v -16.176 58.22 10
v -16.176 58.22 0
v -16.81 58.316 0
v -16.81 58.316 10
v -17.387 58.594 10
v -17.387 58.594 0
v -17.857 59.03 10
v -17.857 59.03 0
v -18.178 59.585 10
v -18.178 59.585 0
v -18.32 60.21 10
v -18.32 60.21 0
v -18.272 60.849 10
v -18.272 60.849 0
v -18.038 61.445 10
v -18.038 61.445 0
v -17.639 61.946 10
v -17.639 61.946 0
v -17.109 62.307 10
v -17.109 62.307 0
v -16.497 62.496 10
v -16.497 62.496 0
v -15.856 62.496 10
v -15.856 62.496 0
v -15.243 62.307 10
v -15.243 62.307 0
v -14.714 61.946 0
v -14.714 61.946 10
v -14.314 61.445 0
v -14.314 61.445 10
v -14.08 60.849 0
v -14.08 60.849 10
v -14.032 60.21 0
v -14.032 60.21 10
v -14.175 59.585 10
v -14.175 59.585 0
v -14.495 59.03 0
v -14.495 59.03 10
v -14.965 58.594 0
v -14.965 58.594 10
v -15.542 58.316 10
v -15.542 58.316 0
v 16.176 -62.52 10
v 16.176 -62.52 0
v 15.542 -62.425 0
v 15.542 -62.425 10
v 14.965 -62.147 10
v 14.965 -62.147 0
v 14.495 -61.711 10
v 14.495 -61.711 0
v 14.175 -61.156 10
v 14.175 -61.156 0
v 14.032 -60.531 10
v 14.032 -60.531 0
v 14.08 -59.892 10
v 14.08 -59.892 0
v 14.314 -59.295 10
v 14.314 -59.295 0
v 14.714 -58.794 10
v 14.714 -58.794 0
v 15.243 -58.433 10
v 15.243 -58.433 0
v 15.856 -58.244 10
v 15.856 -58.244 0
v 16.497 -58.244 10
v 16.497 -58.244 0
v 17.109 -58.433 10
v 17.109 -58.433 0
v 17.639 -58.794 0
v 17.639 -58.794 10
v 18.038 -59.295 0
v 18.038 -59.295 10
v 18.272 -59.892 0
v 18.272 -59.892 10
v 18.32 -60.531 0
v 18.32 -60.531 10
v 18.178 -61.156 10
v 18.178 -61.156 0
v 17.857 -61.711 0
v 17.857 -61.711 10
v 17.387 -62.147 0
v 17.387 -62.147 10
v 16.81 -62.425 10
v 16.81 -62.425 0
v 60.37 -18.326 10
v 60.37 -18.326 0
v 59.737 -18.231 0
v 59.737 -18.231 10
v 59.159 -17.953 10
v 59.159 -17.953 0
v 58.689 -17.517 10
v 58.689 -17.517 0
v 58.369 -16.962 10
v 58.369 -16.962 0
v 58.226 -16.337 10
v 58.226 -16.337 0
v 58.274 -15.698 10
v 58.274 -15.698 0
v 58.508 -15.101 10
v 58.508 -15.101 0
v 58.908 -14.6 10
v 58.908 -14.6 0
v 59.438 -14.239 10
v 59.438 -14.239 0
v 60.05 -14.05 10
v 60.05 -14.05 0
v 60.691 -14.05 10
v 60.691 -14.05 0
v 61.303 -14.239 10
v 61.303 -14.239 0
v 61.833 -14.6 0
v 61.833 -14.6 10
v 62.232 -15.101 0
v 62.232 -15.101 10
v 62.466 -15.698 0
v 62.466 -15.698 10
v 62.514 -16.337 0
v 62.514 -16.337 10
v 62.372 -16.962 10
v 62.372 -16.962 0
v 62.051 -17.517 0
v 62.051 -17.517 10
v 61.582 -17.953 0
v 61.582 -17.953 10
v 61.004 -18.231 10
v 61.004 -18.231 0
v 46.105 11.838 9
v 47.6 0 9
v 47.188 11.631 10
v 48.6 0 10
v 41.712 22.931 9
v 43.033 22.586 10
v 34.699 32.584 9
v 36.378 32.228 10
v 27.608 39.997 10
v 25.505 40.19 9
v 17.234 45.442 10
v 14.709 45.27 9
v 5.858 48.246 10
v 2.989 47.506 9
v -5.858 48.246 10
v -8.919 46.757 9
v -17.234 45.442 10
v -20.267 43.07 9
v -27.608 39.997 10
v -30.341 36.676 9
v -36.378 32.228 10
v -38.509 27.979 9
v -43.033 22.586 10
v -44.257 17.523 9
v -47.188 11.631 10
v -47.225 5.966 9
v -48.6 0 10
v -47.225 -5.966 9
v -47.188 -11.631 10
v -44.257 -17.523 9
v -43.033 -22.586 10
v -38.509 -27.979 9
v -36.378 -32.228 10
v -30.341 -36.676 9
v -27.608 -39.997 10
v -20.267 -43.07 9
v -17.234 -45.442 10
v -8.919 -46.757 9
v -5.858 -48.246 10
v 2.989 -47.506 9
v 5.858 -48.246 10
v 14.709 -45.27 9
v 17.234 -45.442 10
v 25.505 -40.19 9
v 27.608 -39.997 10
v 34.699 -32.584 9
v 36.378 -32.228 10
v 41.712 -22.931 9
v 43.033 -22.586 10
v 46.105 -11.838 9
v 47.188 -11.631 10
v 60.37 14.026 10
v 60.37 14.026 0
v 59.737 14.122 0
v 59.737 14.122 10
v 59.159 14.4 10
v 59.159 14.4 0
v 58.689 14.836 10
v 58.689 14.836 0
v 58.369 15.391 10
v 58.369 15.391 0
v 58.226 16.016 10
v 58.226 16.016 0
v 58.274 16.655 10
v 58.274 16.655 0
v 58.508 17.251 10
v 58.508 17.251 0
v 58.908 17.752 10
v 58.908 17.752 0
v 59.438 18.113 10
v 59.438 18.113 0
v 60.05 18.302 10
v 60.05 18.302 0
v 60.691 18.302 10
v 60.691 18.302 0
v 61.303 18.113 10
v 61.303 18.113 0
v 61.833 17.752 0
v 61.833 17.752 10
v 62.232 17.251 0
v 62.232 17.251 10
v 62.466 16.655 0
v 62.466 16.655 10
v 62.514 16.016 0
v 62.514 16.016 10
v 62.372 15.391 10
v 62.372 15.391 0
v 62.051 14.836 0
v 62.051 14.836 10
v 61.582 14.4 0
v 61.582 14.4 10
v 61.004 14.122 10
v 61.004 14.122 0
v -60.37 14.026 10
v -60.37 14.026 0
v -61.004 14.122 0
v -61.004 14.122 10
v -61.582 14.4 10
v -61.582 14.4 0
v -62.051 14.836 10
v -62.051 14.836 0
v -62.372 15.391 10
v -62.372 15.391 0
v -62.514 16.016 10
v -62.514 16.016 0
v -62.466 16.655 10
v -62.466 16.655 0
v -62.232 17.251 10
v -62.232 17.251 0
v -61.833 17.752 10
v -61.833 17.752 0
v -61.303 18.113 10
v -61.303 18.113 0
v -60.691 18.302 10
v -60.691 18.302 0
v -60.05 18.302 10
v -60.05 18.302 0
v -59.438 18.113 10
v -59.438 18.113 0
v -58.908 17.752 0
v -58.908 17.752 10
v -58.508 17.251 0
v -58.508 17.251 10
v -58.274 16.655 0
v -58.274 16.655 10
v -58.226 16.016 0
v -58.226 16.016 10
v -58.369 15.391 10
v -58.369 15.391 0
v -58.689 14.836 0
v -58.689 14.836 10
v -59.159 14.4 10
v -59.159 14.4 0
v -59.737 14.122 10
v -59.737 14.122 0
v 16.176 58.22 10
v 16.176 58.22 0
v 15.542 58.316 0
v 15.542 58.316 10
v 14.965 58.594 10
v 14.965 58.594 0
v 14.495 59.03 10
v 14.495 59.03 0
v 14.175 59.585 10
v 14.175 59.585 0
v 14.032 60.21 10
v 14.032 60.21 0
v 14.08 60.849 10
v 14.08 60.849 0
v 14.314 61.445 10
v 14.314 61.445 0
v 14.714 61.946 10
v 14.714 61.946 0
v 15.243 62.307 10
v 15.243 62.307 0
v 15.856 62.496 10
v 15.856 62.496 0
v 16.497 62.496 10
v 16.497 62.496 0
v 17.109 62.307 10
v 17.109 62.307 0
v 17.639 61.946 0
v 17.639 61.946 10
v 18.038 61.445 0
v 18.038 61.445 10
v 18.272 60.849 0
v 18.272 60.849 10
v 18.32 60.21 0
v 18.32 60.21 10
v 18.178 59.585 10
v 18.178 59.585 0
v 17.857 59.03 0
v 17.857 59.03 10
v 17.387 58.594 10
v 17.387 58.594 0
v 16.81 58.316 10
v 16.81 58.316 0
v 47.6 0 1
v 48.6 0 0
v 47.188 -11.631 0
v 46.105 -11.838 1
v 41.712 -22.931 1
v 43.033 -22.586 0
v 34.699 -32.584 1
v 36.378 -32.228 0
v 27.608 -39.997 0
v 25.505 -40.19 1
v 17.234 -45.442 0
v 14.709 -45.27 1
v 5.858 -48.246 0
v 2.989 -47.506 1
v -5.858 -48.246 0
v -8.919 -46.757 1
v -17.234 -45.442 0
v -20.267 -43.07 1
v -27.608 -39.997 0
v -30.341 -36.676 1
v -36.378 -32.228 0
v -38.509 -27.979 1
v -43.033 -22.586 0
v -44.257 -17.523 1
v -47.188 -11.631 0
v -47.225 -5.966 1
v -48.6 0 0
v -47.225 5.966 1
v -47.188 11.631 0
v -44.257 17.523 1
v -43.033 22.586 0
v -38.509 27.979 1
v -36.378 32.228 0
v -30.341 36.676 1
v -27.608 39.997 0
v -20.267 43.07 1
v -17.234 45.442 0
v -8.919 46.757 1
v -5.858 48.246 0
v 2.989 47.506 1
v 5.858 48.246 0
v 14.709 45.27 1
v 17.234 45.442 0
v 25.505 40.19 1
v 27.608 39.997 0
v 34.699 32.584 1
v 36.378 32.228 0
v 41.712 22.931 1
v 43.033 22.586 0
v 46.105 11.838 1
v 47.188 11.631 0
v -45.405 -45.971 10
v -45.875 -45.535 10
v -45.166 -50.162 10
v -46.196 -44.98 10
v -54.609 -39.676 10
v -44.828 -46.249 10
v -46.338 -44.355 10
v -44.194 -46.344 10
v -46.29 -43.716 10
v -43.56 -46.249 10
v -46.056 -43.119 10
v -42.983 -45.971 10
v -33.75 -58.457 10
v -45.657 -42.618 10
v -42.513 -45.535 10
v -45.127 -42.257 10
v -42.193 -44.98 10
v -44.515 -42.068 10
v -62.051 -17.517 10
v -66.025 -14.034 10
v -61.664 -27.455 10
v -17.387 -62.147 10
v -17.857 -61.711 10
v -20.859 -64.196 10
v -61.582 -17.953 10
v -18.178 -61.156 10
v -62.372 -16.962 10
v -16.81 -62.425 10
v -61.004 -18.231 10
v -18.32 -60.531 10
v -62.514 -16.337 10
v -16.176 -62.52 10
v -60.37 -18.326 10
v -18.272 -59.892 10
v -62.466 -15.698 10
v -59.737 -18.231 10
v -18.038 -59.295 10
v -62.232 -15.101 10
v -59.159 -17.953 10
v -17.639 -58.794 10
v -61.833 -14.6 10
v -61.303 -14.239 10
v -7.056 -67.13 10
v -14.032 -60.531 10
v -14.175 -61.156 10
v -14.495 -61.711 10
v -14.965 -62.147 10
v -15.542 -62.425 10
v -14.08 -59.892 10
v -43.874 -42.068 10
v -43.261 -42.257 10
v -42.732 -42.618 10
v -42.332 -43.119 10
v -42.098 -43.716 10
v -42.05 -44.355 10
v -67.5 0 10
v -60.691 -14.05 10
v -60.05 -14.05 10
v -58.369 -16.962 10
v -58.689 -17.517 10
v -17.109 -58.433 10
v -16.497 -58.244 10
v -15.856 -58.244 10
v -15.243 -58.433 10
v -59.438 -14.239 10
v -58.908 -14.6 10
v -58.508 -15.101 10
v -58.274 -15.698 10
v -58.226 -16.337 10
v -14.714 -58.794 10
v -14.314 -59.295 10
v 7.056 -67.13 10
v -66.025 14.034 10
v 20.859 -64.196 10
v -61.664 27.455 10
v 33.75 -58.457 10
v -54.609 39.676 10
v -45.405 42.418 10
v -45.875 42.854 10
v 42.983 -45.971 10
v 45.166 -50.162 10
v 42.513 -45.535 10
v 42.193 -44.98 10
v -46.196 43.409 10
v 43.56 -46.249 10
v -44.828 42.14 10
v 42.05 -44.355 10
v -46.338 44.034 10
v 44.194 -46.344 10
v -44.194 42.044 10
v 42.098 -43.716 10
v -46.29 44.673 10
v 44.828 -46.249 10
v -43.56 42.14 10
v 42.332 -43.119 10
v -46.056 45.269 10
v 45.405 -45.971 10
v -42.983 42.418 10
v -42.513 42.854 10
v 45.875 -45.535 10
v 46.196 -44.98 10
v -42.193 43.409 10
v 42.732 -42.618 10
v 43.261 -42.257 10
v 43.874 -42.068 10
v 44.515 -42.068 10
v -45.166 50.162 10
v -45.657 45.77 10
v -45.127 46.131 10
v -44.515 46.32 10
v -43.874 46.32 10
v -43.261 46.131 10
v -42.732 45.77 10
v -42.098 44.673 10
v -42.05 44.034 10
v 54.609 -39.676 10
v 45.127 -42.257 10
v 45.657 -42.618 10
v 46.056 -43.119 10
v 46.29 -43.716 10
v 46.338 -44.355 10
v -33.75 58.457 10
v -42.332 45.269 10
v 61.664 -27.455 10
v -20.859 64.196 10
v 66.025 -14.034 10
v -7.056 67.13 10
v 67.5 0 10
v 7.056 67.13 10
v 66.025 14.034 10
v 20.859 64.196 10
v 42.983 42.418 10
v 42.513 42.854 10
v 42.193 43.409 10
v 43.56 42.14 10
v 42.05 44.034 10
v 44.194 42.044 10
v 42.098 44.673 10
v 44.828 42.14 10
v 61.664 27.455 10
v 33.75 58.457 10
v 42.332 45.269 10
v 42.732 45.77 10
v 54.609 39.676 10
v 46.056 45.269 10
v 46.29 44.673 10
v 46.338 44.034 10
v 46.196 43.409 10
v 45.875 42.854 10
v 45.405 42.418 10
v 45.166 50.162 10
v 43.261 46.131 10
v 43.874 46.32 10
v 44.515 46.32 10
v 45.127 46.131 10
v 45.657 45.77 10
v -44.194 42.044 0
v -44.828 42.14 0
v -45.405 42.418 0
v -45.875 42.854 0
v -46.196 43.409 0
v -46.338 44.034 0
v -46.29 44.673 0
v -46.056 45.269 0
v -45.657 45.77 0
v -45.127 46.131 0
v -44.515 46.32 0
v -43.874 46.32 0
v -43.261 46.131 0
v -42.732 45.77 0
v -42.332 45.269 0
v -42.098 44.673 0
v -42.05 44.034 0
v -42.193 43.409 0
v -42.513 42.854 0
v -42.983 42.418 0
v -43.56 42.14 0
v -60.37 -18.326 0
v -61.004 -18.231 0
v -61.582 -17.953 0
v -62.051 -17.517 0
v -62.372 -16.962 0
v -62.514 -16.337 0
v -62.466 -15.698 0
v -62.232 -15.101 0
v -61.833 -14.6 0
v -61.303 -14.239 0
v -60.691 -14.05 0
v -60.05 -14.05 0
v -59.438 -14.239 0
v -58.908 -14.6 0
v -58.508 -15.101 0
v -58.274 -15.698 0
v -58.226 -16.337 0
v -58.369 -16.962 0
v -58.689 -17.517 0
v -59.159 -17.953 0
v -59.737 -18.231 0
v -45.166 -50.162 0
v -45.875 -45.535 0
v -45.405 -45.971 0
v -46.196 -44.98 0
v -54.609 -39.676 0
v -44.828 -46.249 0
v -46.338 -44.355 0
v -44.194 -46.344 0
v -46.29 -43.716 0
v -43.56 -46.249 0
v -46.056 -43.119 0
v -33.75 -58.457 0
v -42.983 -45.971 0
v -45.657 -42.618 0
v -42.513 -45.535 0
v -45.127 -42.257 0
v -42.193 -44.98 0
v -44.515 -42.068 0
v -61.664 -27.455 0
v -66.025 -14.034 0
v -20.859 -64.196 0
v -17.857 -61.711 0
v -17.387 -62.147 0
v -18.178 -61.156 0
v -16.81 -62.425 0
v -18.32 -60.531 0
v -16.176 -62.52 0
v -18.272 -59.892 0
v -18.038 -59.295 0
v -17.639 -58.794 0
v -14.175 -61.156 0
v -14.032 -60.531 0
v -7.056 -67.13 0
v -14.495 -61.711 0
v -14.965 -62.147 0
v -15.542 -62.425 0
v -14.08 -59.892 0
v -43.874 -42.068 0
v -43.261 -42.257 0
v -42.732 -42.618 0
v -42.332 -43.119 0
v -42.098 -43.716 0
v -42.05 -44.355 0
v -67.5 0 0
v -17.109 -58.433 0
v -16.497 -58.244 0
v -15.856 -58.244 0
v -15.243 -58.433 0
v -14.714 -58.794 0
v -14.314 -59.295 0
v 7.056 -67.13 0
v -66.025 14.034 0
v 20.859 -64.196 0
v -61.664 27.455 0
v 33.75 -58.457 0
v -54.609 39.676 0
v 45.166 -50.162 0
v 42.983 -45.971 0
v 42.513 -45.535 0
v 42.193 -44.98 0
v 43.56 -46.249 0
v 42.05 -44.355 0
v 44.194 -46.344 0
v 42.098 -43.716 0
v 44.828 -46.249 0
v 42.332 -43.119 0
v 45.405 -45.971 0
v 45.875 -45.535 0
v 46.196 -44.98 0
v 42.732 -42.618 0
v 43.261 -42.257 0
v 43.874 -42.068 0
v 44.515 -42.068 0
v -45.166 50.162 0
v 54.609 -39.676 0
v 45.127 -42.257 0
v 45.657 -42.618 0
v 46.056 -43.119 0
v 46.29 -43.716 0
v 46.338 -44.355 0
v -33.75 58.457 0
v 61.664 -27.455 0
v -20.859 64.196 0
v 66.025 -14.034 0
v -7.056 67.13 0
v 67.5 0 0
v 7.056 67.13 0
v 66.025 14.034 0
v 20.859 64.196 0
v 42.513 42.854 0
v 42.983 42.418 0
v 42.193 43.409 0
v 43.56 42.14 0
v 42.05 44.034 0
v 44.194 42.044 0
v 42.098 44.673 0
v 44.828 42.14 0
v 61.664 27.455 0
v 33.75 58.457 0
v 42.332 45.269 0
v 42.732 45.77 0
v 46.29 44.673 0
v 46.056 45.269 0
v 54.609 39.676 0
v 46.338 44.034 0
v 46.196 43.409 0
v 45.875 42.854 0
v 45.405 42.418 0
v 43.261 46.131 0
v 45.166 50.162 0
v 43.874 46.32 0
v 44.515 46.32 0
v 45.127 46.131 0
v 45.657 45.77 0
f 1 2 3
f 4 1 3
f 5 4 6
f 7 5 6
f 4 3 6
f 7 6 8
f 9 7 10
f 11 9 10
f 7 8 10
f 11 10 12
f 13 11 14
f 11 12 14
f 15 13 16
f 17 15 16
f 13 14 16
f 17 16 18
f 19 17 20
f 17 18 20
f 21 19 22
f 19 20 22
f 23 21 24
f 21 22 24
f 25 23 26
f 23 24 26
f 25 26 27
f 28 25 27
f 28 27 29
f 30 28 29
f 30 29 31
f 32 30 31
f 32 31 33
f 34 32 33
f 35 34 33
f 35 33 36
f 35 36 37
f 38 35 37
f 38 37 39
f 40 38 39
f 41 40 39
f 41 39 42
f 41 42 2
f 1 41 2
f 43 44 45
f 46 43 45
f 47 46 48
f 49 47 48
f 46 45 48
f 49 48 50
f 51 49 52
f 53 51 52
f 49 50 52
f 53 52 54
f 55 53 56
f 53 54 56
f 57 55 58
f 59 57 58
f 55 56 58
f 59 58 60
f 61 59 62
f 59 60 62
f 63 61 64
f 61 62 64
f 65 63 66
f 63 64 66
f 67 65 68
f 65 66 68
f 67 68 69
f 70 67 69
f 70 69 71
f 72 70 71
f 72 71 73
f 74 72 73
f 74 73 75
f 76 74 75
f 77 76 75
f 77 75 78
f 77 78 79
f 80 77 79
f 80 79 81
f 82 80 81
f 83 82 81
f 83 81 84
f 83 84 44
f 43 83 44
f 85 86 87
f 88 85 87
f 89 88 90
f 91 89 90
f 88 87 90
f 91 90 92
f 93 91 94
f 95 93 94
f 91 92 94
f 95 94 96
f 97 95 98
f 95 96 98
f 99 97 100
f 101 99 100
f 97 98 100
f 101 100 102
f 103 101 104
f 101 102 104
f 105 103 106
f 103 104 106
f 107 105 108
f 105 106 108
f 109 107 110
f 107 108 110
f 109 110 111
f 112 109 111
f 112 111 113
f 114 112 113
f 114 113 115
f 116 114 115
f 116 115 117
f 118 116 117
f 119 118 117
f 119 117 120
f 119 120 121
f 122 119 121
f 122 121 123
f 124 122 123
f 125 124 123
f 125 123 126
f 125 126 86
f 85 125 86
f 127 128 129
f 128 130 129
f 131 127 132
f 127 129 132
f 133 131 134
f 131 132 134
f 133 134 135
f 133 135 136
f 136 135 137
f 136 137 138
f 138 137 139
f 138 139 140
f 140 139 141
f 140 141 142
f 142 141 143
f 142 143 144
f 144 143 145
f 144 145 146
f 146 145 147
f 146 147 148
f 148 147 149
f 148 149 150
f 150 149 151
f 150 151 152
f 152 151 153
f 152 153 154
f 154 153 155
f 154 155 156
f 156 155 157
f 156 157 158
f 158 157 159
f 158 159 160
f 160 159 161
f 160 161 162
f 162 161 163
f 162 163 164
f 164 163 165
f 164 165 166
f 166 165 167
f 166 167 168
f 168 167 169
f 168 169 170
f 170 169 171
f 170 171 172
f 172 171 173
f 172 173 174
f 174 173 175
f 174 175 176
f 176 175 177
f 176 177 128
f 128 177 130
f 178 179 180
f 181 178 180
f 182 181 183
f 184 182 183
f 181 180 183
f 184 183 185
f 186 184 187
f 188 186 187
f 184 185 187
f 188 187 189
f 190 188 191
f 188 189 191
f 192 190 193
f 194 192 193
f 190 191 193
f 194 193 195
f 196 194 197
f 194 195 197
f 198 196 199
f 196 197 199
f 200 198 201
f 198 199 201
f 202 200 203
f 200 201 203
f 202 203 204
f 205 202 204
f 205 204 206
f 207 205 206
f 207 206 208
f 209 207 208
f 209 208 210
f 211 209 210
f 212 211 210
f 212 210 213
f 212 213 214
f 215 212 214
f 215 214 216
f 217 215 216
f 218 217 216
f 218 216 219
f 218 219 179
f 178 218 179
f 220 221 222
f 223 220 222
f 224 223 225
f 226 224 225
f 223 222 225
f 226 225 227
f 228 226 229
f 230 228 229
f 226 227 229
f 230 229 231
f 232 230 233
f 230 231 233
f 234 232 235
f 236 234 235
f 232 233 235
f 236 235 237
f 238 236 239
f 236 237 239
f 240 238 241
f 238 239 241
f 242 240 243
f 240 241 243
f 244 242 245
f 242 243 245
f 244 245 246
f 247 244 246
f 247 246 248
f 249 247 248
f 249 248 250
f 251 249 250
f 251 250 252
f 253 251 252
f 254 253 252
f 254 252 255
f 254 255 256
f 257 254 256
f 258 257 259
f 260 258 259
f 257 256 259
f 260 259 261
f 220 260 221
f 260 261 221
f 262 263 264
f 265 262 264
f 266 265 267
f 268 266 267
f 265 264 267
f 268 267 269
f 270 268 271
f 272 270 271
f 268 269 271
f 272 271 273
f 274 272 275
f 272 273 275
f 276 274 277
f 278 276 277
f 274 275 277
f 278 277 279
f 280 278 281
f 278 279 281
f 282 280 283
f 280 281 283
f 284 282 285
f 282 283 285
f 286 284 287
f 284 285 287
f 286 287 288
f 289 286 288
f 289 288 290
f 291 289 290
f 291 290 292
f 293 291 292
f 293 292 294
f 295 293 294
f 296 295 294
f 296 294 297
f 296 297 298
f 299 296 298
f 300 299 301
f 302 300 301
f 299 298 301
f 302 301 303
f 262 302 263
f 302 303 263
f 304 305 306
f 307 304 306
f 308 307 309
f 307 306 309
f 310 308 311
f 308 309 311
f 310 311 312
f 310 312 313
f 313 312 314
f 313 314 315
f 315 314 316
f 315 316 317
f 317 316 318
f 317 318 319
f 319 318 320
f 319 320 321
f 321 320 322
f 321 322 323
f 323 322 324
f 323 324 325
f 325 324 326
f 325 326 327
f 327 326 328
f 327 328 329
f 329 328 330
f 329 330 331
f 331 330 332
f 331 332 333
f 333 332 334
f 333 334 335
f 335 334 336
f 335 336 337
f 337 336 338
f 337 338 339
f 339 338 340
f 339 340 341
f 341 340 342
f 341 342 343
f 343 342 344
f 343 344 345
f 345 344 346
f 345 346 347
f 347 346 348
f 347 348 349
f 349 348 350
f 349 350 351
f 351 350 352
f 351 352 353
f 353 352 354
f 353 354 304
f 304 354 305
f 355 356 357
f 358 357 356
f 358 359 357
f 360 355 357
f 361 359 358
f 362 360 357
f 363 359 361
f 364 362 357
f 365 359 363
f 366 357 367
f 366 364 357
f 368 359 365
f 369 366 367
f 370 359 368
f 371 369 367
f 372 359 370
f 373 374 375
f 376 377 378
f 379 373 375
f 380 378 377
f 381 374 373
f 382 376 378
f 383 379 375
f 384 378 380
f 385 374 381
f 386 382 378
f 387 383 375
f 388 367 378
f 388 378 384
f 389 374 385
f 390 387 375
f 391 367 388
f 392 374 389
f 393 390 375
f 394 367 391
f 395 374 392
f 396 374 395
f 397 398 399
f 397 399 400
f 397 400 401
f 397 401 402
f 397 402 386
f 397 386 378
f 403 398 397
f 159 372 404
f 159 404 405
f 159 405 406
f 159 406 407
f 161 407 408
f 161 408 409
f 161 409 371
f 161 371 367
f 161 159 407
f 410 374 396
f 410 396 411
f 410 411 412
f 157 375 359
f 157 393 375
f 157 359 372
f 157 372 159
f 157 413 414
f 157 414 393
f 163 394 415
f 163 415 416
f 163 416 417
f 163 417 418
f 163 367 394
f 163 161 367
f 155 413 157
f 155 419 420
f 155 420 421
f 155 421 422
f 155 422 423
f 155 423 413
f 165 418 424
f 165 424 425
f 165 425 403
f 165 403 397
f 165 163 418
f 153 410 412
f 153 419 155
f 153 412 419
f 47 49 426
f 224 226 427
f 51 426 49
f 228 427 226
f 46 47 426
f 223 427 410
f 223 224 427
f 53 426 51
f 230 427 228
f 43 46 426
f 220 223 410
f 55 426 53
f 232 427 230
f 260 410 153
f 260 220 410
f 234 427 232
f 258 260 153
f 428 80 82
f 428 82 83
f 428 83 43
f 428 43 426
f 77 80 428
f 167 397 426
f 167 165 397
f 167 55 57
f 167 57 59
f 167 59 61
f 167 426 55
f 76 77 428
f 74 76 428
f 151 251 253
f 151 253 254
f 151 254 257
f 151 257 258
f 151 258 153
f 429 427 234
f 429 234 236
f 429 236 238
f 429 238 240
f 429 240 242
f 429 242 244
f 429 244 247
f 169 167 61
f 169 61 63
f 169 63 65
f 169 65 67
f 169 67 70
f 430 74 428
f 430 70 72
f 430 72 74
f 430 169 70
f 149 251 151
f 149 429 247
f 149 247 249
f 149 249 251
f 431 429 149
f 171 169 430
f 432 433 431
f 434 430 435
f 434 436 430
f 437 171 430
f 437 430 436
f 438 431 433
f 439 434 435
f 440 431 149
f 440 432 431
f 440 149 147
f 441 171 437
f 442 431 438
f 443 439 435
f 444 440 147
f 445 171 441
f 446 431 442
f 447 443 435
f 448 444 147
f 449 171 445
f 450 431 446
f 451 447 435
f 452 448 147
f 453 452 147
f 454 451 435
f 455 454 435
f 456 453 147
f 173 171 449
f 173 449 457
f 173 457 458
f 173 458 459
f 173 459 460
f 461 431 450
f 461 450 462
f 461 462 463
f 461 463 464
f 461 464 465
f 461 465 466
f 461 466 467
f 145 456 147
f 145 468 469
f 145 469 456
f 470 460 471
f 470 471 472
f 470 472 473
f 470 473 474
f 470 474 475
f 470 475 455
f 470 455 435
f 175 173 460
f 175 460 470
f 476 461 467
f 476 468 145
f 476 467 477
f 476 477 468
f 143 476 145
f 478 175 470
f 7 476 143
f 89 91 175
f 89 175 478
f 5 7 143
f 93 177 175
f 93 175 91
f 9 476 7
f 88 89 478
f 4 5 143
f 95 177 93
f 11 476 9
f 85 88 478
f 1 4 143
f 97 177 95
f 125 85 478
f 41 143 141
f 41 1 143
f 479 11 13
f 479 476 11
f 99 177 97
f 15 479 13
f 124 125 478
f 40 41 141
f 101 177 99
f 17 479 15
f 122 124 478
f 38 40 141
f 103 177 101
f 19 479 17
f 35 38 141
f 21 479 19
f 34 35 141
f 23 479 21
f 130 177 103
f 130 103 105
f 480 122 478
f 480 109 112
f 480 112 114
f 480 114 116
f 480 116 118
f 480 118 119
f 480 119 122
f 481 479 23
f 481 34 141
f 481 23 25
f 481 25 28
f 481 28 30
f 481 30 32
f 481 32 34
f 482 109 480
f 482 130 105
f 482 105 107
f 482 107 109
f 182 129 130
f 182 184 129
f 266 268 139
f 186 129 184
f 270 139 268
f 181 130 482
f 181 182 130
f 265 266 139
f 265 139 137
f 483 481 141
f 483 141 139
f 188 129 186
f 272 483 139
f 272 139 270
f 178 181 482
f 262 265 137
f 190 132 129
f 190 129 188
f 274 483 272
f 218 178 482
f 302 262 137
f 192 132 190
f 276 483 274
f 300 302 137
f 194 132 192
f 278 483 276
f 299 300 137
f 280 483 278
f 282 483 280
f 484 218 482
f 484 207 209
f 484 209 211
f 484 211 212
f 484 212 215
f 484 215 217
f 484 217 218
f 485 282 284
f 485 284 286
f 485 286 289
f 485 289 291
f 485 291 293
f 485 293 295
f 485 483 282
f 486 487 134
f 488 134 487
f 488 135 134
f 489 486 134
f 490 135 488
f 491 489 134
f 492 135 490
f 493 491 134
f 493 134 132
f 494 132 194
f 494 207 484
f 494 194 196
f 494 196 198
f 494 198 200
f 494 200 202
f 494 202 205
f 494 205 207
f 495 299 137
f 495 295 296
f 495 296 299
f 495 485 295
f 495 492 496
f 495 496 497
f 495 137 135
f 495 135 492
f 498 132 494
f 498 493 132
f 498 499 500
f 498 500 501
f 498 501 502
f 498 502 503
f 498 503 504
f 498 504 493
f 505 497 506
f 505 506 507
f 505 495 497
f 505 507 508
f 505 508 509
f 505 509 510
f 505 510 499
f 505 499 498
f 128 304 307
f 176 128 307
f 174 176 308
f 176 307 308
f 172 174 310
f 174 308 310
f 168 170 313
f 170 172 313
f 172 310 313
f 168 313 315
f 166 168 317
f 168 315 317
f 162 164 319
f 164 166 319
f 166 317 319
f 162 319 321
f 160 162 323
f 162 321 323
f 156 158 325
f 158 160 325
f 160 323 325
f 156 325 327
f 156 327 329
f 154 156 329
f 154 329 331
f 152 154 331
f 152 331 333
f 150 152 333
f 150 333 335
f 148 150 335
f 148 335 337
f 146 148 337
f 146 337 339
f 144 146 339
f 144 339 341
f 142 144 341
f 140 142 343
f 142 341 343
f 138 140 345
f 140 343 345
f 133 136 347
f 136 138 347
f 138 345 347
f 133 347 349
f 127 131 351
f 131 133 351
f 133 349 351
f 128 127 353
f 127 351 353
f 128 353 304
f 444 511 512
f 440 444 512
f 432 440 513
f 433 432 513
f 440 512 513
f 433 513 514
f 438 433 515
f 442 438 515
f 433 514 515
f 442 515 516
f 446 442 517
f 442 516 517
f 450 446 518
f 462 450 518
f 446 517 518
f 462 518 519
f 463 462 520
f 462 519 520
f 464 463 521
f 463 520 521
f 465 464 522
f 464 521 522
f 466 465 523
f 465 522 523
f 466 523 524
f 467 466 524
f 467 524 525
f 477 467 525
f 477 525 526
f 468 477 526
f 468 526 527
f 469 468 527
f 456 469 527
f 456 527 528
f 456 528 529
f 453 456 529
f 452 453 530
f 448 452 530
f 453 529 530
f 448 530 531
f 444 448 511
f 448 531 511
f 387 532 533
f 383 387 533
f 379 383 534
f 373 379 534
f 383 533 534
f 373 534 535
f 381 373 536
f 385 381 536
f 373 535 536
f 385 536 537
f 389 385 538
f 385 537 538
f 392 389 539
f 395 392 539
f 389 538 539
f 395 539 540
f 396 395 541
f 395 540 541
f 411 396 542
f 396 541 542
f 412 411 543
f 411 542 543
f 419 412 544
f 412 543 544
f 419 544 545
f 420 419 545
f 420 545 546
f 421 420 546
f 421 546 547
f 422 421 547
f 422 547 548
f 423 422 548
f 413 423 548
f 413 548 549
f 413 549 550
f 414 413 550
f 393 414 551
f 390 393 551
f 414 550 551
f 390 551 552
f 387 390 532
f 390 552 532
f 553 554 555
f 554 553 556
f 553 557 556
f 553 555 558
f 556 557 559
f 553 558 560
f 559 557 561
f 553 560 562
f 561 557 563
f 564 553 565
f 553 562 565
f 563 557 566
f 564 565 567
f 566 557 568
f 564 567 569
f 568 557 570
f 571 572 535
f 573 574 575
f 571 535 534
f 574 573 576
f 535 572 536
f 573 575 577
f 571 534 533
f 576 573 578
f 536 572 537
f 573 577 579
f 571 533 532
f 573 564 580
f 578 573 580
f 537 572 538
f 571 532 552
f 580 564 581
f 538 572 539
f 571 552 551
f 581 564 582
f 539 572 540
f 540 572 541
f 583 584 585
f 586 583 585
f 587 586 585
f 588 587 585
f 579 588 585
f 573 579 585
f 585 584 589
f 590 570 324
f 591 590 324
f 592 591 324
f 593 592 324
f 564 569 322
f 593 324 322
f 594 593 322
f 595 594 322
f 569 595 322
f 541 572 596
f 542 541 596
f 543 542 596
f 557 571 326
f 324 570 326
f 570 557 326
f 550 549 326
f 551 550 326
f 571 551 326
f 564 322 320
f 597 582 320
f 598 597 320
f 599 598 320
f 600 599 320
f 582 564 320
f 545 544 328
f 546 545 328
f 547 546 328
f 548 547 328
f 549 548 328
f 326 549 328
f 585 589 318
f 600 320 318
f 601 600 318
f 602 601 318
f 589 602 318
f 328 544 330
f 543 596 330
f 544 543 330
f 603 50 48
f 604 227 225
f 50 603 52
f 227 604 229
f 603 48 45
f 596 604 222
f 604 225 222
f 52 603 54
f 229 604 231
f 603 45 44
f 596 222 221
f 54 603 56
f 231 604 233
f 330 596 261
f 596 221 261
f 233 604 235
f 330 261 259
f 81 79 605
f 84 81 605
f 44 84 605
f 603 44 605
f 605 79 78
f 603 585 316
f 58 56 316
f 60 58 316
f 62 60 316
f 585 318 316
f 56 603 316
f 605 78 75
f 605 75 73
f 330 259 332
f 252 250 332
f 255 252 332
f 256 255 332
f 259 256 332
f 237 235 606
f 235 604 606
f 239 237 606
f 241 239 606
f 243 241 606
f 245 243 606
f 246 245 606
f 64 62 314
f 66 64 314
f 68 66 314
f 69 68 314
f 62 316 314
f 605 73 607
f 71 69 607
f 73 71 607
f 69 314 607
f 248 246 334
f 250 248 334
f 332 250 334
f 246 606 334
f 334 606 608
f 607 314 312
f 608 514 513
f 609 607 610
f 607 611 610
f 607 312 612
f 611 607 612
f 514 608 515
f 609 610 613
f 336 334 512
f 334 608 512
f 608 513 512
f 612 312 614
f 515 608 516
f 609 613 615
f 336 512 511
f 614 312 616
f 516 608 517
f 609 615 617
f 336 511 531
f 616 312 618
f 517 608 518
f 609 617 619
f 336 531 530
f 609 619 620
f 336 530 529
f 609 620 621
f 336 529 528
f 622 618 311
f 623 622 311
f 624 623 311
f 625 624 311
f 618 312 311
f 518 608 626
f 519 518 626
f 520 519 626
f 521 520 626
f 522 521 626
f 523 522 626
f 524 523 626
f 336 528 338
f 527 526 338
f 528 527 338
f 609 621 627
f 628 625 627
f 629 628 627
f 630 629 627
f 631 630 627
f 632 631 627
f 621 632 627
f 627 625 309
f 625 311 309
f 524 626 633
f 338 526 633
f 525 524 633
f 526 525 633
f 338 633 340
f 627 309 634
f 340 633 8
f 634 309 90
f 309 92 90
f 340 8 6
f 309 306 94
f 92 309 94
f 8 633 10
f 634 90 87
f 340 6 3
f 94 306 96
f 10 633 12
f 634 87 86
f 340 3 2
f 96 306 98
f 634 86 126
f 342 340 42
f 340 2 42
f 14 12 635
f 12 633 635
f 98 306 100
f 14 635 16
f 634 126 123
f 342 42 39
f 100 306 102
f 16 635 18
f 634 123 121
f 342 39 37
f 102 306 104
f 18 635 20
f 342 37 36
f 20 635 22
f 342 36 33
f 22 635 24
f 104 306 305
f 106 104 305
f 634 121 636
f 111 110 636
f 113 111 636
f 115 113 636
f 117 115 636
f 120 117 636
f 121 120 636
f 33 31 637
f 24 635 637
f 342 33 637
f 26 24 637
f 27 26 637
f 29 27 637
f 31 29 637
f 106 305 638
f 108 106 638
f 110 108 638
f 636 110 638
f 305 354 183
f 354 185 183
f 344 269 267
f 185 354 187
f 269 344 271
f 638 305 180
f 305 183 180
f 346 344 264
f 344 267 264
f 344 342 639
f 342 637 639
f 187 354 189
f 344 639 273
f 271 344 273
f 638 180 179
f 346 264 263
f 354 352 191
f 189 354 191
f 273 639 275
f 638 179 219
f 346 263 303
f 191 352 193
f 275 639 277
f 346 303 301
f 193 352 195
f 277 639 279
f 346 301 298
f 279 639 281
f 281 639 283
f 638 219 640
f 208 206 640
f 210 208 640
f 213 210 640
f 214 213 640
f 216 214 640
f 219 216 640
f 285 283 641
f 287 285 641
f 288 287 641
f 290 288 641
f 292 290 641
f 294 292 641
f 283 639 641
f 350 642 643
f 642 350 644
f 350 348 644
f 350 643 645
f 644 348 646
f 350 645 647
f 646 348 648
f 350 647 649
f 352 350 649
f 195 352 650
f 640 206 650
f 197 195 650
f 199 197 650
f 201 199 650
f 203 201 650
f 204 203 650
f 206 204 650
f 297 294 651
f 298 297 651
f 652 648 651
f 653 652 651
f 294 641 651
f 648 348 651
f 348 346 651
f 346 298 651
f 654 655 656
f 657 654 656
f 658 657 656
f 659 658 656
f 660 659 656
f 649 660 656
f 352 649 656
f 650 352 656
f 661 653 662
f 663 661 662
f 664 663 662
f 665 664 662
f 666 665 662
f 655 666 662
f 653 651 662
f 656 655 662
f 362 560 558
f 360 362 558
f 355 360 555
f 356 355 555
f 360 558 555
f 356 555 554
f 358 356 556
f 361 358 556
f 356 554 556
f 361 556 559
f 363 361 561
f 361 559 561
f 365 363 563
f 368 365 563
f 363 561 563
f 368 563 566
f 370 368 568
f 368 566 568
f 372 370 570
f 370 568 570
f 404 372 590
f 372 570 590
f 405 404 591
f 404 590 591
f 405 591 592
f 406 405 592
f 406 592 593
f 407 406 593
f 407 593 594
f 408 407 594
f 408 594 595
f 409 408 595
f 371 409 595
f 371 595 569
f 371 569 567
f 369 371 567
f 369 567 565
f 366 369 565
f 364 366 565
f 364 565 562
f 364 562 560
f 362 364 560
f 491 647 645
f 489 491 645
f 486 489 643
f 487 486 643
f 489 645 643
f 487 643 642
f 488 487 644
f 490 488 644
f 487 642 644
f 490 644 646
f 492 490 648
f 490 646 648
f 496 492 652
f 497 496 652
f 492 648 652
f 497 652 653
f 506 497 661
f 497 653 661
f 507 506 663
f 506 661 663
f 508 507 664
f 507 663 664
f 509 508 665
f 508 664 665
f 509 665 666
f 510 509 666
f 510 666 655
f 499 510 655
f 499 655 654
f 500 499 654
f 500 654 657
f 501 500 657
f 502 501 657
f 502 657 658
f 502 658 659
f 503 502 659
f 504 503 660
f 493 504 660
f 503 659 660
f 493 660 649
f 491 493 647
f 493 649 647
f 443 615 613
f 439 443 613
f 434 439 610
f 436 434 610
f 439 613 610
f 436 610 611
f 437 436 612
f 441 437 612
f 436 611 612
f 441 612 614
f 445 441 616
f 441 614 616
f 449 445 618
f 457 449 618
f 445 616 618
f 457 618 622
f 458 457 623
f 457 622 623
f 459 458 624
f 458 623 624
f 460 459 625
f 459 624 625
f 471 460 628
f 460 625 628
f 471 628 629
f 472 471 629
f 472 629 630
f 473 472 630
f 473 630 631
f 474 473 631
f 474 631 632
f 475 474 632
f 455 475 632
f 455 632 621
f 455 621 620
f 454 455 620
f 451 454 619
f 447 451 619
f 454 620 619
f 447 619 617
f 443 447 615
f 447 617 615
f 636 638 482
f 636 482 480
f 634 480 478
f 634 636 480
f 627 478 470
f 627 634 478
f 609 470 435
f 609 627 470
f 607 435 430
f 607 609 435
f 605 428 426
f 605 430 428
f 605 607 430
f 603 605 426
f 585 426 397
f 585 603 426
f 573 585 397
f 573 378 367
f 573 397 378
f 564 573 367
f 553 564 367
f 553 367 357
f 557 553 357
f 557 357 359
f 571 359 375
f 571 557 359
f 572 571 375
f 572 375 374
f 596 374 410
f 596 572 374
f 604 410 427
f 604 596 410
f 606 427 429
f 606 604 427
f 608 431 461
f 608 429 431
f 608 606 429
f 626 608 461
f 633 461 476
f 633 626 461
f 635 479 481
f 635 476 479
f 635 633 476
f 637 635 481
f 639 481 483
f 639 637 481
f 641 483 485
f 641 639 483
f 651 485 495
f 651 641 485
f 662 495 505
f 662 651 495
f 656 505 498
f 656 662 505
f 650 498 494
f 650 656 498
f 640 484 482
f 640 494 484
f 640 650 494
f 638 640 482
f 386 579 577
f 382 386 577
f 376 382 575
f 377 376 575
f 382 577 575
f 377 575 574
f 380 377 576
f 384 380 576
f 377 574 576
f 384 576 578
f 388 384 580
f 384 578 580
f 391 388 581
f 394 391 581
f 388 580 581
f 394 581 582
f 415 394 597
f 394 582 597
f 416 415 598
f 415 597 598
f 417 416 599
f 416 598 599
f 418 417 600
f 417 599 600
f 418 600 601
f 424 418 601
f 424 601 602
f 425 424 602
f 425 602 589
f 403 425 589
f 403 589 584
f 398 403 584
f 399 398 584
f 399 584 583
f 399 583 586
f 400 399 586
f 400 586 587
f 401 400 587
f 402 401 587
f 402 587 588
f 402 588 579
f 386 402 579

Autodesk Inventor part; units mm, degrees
ref_plane "YZ Plane" through (0, 0, 0) normal (1, 0, 0) x (0, 1, 0)
ref_plane "XZ Plane" through (0, 0, 0) normal (0, 1, 0) x (-1, 0, 0)
ref_plane "XY Plane" through (0, 0, 0) normal (0, 0, 1) x (1, 0, 0)
sketch "スケッチ1" plane through (0, 0, 0) normal (0, 0, 1) x (1, 0, 0)
  circle A0 centre (0, 0) radius 47.6
  circle A1 centre (0, 0) radius 67.5
  dimension "d0" = 95.2
  dimension "d1" = 135
extrude "押し出し1" add sketch "スケッチ1" along normal blind 10
sketch "スケッチ2" plane through (0, 0, 10) normal (0, 0, 1) x (1, 0, 0)
  circle A0 centre (0, 0) radius 62.5
  point P0 (16.1762, 60.3704)
  point P1 (-16.1762, 60.3704)
  point P2 (-44.1942, 44.1942)
  point P3 (-60.3704, 16.1762)
  point P4 (-60.3704, -16.1762)
  point P5 (-44.1942, -44.1942)
  point P6 (-16.1762, -60.3704)
  point P7 (16.1762, -60.3704)
  point P8 (44.1942, -44.1942)
  point P9 (60.3704, -16.1762)
  point P10 (60.3704, 16.1762)
  point P11 (44.1942, 44.1942)
  dimension "d4" = 125
  dimension "d7" = 360
  dimension "d25" = 0
hole "穴1" at (16.1762, 60.3704, 10) at (-16.1762, 60.3704, 10) at (-44.1942, 44.1942, 10) at (-60.3704, 16.1762, 10) at (-60.3704, -16.1762, 10) at (-44.1942, -44.1942, 10) at (-16.1762, -60.3704, 10) at (16.1762, -60.3704, 10) at (44.1942, -44.1942, 10) at (60.3704, -16.1762, 10) at (60.3704, 16.1762, 10) at (44.1942, 44.1942, 10) direction (0, 0, -1) diameter 4.3 end through all clearance for "Flat Head Machine Screw" size "M4" standard "Ansi Metric M Profile"
chamfer "面取り1" distance 1 angle 45 2 edges at (-47.6, 0, 10) (-47.6, 0, 0)
sketch "スケッチ3" plane through (0, 0, 10) normal (0, 0, 1) x (1, 0, 0)
  circle A0 centre (16.1762, 60.3704) radius 2.15 projected
  circle A1 centre (-16.1762, 60.3704) radius 2.15 projected
  circle A2 centre (0, 0) radius 67.5 projected
  circle A3 centre (0, 0) radius 62.5
  circle A4 centre (-16.1762, 60.3704) radius 5
  circle A5 centre (16.1762, 60.3704) radius 5
  point P0 (11.2987, 61.4702)
  point P1 (17.4703, 65.2)
  point P2 (-17.4703, 65.2)
  point P3 (-20.9502, 58.8841)
properties part number "unit-j2-base2" material "ABS プラスチック"
